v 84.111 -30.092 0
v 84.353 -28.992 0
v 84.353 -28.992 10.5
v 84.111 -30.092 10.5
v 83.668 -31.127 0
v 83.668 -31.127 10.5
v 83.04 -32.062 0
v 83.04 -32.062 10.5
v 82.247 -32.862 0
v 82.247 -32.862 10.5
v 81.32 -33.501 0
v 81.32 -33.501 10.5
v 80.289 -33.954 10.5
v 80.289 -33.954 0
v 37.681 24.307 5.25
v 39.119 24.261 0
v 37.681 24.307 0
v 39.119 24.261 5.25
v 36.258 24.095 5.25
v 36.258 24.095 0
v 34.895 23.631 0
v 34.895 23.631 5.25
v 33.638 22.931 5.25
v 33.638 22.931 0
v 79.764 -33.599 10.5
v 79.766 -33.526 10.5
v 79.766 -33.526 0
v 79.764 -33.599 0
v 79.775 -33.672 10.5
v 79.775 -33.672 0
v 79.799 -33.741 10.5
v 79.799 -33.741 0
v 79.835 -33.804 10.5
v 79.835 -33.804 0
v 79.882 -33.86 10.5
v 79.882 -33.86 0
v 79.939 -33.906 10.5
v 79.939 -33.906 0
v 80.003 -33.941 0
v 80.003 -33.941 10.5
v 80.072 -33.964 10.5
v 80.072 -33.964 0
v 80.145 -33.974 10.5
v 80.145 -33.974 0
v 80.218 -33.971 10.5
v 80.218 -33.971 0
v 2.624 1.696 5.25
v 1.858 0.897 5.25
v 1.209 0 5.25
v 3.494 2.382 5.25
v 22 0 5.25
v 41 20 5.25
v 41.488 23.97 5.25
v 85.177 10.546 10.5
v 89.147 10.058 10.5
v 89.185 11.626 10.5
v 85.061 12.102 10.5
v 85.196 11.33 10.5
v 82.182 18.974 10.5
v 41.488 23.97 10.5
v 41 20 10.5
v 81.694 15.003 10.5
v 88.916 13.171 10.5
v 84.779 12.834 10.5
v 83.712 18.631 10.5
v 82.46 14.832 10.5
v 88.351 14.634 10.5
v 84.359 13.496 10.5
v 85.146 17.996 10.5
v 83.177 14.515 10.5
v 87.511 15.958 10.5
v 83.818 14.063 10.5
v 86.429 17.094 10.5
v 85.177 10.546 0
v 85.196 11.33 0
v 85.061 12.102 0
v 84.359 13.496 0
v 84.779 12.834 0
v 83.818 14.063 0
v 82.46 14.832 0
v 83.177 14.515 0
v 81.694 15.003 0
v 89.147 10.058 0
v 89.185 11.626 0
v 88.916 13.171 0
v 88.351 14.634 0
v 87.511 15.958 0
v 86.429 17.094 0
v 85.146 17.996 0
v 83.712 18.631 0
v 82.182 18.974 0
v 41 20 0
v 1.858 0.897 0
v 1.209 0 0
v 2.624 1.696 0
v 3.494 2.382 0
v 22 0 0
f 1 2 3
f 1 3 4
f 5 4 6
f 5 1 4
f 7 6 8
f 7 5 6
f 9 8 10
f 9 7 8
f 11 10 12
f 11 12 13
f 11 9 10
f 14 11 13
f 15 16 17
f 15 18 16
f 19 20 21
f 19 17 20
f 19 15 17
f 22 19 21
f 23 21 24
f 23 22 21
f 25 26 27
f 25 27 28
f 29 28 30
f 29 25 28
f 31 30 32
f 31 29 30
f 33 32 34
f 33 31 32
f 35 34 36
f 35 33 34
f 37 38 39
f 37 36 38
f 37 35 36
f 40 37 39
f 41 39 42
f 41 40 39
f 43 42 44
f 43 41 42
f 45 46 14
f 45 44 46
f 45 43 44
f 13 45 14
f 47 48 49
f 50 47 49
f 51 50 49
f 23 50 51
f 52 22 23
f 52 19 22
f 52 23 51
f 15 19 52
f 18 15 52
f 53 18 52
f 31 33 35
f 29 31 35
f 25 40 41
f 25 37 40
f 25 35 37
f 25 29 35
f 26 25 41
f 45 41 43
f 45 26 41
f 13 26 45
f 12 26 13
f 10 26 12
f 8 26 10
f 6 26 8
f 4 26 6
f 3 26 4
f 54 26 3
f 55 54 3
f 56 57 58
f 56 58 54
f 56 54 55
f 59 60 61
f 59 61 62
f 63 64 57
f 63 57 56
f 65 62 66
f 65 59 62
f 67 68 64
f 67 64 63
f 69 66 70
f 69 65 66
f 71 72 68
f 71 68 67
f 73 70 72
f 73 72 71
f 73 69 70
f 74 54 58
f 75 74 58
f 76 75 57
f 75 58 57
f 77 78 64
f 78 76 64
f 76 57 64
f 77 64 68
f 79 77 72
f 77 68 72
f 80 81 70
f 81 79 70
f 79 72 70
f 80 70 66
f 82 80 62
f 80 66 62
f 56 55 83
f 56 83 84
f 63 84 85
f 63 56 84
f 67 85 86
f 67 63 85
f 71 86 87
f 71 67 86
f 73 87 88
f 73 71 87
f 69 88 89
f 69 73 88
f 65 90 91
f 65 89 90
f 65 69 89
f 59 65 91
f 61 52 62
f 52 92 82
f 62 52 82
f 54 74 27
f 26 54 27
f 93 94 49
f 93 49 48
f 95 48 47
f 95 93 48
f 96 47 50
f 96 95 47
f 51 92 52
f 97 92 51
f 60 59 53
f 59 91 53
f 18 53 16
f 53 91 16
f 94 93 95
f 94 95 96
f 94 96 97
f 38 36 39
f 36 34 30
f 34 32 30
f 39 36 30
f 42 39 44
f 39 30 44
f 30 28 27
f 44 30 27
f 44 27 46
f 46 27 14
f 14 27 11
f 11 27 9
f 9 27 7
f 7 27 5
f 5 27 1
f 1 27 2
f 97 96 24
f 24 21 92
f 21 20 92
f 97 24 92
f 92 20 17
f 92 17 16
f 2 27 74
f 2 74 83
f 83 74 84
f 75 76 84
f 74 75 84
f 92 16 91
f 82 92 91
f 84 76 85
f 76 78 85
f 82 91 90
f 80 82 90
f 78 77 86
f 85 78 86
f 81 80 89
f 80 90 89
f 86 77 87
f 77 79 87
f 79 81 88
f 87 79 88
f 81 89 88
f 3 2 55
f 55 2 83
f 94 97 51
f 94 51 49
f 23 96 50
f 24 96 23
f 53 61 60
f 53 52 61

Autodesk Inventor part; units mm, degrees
ref_plane "YZ Plane" through (0, 0, 0) normal (1, 0, 0) x (0, 1, 0)
ref_plane "XZ Plane" through (0, 0, 0) normal (0, 1, 0) x (-1, 0, 0)
ref_plane "XY Plane" through (0, 0, 0) normal (0, 0, 1) x (1, 0, 0)
sketch "Base Sketch" plane through (0, 0, 0) normal (0, 0, 1) x (1, 0, 0)
  line L0 (22, 0) -> (0, 0)
  line L1 (3.4939, 2.3817) -> (36.1282, 24.6282)
  line L2 (41, 20) -> (22, 0)
  line L3 (41, 20) -> (85.6646, 14.5159)
  line L4 (90.1222, 17.9986) -> (36.1282, 24.6282)
  line L5 (36.1282, 24.6282) -> (41, 20) construction
  line L6 (41, 20) -> (41.4875, 23.9702)
  line L7 (3.4939, 2.3817) -> (0, 0) construction
  line L8 (0, 0) -> (0, -2.6652) construction
  arc A0 (3.4939, 2.3817) -> (0, -4.2285) centre (8, -4.2285) ccw
  line L9 (85.6646, 14.5159) -> (79.693, -34.1189)
  line L10 (79.693, -34.1189) -> (83.6632, -34.6064)
  line L11 (83.6632, -34.6064) -> (90.1222, 17.9986)
  point P0 (1.2088, 0)
  dimension "d2" = 22
  dimension "d3" = 20
  dimension "d4" = 19
  dimension "d5" = 4
  dimension "d24" = 8
  dimension "d25" = 4
  dimension "d27" = 7
  dimension "d28" = 45
  dimension "d29" = 49
extrude "Lower Arm" add sketch "Base Sketch" along normal blind 5.25 contours L0 A0 L1 L4 L6 L2
extrude "Upper Arm" add sketch "Base Sketch" along normal blind 10.5 contours L6 L4 L11 L10 L9 L3
fillet "Fillet1" radius 8 2 edges at (36.1282, 24.6282, 2.625) (90.1222, 17.9986, 5.25)
fillet "Fillet1" radius 4 1 edges at (85.6646, 14.5159, 5.25)
fillet "Fillet3" radius 6 1 edges at (83.6632, -34.6064, 5.25)
fillet "Fillet4" radius 0.4 1 edges at (79.693, -34.1189, 5.25)
equation "\"d2\" = ConnectionWidth"
equation "\"d3\" = ArmDistance"
equation "\"d4\" = ArmTravelToDistance"
equation "\"d5\" = ArmThickness"
equation "\"d25\" = ArmThickness"
equation "\"d18\" = 0.5 * KeySpacing + 0.5 * KeyWidth"
equation "\"d20\" = KeyWidth + KeySpacing"
equation "\"ConnectionWidth\" = 22"
equation "\"ArmDistance\" = 20"
equation "\"ArmTravelToDistance\" = 19"
equation "\"ArmThickness\" = 4"
equation "\"KeySpacing\" = 0.5"
equation "\"KeyWidth\" = 10"
properties part number "HousingArm0" material "PLA Plastic (Glacial Blue)"
